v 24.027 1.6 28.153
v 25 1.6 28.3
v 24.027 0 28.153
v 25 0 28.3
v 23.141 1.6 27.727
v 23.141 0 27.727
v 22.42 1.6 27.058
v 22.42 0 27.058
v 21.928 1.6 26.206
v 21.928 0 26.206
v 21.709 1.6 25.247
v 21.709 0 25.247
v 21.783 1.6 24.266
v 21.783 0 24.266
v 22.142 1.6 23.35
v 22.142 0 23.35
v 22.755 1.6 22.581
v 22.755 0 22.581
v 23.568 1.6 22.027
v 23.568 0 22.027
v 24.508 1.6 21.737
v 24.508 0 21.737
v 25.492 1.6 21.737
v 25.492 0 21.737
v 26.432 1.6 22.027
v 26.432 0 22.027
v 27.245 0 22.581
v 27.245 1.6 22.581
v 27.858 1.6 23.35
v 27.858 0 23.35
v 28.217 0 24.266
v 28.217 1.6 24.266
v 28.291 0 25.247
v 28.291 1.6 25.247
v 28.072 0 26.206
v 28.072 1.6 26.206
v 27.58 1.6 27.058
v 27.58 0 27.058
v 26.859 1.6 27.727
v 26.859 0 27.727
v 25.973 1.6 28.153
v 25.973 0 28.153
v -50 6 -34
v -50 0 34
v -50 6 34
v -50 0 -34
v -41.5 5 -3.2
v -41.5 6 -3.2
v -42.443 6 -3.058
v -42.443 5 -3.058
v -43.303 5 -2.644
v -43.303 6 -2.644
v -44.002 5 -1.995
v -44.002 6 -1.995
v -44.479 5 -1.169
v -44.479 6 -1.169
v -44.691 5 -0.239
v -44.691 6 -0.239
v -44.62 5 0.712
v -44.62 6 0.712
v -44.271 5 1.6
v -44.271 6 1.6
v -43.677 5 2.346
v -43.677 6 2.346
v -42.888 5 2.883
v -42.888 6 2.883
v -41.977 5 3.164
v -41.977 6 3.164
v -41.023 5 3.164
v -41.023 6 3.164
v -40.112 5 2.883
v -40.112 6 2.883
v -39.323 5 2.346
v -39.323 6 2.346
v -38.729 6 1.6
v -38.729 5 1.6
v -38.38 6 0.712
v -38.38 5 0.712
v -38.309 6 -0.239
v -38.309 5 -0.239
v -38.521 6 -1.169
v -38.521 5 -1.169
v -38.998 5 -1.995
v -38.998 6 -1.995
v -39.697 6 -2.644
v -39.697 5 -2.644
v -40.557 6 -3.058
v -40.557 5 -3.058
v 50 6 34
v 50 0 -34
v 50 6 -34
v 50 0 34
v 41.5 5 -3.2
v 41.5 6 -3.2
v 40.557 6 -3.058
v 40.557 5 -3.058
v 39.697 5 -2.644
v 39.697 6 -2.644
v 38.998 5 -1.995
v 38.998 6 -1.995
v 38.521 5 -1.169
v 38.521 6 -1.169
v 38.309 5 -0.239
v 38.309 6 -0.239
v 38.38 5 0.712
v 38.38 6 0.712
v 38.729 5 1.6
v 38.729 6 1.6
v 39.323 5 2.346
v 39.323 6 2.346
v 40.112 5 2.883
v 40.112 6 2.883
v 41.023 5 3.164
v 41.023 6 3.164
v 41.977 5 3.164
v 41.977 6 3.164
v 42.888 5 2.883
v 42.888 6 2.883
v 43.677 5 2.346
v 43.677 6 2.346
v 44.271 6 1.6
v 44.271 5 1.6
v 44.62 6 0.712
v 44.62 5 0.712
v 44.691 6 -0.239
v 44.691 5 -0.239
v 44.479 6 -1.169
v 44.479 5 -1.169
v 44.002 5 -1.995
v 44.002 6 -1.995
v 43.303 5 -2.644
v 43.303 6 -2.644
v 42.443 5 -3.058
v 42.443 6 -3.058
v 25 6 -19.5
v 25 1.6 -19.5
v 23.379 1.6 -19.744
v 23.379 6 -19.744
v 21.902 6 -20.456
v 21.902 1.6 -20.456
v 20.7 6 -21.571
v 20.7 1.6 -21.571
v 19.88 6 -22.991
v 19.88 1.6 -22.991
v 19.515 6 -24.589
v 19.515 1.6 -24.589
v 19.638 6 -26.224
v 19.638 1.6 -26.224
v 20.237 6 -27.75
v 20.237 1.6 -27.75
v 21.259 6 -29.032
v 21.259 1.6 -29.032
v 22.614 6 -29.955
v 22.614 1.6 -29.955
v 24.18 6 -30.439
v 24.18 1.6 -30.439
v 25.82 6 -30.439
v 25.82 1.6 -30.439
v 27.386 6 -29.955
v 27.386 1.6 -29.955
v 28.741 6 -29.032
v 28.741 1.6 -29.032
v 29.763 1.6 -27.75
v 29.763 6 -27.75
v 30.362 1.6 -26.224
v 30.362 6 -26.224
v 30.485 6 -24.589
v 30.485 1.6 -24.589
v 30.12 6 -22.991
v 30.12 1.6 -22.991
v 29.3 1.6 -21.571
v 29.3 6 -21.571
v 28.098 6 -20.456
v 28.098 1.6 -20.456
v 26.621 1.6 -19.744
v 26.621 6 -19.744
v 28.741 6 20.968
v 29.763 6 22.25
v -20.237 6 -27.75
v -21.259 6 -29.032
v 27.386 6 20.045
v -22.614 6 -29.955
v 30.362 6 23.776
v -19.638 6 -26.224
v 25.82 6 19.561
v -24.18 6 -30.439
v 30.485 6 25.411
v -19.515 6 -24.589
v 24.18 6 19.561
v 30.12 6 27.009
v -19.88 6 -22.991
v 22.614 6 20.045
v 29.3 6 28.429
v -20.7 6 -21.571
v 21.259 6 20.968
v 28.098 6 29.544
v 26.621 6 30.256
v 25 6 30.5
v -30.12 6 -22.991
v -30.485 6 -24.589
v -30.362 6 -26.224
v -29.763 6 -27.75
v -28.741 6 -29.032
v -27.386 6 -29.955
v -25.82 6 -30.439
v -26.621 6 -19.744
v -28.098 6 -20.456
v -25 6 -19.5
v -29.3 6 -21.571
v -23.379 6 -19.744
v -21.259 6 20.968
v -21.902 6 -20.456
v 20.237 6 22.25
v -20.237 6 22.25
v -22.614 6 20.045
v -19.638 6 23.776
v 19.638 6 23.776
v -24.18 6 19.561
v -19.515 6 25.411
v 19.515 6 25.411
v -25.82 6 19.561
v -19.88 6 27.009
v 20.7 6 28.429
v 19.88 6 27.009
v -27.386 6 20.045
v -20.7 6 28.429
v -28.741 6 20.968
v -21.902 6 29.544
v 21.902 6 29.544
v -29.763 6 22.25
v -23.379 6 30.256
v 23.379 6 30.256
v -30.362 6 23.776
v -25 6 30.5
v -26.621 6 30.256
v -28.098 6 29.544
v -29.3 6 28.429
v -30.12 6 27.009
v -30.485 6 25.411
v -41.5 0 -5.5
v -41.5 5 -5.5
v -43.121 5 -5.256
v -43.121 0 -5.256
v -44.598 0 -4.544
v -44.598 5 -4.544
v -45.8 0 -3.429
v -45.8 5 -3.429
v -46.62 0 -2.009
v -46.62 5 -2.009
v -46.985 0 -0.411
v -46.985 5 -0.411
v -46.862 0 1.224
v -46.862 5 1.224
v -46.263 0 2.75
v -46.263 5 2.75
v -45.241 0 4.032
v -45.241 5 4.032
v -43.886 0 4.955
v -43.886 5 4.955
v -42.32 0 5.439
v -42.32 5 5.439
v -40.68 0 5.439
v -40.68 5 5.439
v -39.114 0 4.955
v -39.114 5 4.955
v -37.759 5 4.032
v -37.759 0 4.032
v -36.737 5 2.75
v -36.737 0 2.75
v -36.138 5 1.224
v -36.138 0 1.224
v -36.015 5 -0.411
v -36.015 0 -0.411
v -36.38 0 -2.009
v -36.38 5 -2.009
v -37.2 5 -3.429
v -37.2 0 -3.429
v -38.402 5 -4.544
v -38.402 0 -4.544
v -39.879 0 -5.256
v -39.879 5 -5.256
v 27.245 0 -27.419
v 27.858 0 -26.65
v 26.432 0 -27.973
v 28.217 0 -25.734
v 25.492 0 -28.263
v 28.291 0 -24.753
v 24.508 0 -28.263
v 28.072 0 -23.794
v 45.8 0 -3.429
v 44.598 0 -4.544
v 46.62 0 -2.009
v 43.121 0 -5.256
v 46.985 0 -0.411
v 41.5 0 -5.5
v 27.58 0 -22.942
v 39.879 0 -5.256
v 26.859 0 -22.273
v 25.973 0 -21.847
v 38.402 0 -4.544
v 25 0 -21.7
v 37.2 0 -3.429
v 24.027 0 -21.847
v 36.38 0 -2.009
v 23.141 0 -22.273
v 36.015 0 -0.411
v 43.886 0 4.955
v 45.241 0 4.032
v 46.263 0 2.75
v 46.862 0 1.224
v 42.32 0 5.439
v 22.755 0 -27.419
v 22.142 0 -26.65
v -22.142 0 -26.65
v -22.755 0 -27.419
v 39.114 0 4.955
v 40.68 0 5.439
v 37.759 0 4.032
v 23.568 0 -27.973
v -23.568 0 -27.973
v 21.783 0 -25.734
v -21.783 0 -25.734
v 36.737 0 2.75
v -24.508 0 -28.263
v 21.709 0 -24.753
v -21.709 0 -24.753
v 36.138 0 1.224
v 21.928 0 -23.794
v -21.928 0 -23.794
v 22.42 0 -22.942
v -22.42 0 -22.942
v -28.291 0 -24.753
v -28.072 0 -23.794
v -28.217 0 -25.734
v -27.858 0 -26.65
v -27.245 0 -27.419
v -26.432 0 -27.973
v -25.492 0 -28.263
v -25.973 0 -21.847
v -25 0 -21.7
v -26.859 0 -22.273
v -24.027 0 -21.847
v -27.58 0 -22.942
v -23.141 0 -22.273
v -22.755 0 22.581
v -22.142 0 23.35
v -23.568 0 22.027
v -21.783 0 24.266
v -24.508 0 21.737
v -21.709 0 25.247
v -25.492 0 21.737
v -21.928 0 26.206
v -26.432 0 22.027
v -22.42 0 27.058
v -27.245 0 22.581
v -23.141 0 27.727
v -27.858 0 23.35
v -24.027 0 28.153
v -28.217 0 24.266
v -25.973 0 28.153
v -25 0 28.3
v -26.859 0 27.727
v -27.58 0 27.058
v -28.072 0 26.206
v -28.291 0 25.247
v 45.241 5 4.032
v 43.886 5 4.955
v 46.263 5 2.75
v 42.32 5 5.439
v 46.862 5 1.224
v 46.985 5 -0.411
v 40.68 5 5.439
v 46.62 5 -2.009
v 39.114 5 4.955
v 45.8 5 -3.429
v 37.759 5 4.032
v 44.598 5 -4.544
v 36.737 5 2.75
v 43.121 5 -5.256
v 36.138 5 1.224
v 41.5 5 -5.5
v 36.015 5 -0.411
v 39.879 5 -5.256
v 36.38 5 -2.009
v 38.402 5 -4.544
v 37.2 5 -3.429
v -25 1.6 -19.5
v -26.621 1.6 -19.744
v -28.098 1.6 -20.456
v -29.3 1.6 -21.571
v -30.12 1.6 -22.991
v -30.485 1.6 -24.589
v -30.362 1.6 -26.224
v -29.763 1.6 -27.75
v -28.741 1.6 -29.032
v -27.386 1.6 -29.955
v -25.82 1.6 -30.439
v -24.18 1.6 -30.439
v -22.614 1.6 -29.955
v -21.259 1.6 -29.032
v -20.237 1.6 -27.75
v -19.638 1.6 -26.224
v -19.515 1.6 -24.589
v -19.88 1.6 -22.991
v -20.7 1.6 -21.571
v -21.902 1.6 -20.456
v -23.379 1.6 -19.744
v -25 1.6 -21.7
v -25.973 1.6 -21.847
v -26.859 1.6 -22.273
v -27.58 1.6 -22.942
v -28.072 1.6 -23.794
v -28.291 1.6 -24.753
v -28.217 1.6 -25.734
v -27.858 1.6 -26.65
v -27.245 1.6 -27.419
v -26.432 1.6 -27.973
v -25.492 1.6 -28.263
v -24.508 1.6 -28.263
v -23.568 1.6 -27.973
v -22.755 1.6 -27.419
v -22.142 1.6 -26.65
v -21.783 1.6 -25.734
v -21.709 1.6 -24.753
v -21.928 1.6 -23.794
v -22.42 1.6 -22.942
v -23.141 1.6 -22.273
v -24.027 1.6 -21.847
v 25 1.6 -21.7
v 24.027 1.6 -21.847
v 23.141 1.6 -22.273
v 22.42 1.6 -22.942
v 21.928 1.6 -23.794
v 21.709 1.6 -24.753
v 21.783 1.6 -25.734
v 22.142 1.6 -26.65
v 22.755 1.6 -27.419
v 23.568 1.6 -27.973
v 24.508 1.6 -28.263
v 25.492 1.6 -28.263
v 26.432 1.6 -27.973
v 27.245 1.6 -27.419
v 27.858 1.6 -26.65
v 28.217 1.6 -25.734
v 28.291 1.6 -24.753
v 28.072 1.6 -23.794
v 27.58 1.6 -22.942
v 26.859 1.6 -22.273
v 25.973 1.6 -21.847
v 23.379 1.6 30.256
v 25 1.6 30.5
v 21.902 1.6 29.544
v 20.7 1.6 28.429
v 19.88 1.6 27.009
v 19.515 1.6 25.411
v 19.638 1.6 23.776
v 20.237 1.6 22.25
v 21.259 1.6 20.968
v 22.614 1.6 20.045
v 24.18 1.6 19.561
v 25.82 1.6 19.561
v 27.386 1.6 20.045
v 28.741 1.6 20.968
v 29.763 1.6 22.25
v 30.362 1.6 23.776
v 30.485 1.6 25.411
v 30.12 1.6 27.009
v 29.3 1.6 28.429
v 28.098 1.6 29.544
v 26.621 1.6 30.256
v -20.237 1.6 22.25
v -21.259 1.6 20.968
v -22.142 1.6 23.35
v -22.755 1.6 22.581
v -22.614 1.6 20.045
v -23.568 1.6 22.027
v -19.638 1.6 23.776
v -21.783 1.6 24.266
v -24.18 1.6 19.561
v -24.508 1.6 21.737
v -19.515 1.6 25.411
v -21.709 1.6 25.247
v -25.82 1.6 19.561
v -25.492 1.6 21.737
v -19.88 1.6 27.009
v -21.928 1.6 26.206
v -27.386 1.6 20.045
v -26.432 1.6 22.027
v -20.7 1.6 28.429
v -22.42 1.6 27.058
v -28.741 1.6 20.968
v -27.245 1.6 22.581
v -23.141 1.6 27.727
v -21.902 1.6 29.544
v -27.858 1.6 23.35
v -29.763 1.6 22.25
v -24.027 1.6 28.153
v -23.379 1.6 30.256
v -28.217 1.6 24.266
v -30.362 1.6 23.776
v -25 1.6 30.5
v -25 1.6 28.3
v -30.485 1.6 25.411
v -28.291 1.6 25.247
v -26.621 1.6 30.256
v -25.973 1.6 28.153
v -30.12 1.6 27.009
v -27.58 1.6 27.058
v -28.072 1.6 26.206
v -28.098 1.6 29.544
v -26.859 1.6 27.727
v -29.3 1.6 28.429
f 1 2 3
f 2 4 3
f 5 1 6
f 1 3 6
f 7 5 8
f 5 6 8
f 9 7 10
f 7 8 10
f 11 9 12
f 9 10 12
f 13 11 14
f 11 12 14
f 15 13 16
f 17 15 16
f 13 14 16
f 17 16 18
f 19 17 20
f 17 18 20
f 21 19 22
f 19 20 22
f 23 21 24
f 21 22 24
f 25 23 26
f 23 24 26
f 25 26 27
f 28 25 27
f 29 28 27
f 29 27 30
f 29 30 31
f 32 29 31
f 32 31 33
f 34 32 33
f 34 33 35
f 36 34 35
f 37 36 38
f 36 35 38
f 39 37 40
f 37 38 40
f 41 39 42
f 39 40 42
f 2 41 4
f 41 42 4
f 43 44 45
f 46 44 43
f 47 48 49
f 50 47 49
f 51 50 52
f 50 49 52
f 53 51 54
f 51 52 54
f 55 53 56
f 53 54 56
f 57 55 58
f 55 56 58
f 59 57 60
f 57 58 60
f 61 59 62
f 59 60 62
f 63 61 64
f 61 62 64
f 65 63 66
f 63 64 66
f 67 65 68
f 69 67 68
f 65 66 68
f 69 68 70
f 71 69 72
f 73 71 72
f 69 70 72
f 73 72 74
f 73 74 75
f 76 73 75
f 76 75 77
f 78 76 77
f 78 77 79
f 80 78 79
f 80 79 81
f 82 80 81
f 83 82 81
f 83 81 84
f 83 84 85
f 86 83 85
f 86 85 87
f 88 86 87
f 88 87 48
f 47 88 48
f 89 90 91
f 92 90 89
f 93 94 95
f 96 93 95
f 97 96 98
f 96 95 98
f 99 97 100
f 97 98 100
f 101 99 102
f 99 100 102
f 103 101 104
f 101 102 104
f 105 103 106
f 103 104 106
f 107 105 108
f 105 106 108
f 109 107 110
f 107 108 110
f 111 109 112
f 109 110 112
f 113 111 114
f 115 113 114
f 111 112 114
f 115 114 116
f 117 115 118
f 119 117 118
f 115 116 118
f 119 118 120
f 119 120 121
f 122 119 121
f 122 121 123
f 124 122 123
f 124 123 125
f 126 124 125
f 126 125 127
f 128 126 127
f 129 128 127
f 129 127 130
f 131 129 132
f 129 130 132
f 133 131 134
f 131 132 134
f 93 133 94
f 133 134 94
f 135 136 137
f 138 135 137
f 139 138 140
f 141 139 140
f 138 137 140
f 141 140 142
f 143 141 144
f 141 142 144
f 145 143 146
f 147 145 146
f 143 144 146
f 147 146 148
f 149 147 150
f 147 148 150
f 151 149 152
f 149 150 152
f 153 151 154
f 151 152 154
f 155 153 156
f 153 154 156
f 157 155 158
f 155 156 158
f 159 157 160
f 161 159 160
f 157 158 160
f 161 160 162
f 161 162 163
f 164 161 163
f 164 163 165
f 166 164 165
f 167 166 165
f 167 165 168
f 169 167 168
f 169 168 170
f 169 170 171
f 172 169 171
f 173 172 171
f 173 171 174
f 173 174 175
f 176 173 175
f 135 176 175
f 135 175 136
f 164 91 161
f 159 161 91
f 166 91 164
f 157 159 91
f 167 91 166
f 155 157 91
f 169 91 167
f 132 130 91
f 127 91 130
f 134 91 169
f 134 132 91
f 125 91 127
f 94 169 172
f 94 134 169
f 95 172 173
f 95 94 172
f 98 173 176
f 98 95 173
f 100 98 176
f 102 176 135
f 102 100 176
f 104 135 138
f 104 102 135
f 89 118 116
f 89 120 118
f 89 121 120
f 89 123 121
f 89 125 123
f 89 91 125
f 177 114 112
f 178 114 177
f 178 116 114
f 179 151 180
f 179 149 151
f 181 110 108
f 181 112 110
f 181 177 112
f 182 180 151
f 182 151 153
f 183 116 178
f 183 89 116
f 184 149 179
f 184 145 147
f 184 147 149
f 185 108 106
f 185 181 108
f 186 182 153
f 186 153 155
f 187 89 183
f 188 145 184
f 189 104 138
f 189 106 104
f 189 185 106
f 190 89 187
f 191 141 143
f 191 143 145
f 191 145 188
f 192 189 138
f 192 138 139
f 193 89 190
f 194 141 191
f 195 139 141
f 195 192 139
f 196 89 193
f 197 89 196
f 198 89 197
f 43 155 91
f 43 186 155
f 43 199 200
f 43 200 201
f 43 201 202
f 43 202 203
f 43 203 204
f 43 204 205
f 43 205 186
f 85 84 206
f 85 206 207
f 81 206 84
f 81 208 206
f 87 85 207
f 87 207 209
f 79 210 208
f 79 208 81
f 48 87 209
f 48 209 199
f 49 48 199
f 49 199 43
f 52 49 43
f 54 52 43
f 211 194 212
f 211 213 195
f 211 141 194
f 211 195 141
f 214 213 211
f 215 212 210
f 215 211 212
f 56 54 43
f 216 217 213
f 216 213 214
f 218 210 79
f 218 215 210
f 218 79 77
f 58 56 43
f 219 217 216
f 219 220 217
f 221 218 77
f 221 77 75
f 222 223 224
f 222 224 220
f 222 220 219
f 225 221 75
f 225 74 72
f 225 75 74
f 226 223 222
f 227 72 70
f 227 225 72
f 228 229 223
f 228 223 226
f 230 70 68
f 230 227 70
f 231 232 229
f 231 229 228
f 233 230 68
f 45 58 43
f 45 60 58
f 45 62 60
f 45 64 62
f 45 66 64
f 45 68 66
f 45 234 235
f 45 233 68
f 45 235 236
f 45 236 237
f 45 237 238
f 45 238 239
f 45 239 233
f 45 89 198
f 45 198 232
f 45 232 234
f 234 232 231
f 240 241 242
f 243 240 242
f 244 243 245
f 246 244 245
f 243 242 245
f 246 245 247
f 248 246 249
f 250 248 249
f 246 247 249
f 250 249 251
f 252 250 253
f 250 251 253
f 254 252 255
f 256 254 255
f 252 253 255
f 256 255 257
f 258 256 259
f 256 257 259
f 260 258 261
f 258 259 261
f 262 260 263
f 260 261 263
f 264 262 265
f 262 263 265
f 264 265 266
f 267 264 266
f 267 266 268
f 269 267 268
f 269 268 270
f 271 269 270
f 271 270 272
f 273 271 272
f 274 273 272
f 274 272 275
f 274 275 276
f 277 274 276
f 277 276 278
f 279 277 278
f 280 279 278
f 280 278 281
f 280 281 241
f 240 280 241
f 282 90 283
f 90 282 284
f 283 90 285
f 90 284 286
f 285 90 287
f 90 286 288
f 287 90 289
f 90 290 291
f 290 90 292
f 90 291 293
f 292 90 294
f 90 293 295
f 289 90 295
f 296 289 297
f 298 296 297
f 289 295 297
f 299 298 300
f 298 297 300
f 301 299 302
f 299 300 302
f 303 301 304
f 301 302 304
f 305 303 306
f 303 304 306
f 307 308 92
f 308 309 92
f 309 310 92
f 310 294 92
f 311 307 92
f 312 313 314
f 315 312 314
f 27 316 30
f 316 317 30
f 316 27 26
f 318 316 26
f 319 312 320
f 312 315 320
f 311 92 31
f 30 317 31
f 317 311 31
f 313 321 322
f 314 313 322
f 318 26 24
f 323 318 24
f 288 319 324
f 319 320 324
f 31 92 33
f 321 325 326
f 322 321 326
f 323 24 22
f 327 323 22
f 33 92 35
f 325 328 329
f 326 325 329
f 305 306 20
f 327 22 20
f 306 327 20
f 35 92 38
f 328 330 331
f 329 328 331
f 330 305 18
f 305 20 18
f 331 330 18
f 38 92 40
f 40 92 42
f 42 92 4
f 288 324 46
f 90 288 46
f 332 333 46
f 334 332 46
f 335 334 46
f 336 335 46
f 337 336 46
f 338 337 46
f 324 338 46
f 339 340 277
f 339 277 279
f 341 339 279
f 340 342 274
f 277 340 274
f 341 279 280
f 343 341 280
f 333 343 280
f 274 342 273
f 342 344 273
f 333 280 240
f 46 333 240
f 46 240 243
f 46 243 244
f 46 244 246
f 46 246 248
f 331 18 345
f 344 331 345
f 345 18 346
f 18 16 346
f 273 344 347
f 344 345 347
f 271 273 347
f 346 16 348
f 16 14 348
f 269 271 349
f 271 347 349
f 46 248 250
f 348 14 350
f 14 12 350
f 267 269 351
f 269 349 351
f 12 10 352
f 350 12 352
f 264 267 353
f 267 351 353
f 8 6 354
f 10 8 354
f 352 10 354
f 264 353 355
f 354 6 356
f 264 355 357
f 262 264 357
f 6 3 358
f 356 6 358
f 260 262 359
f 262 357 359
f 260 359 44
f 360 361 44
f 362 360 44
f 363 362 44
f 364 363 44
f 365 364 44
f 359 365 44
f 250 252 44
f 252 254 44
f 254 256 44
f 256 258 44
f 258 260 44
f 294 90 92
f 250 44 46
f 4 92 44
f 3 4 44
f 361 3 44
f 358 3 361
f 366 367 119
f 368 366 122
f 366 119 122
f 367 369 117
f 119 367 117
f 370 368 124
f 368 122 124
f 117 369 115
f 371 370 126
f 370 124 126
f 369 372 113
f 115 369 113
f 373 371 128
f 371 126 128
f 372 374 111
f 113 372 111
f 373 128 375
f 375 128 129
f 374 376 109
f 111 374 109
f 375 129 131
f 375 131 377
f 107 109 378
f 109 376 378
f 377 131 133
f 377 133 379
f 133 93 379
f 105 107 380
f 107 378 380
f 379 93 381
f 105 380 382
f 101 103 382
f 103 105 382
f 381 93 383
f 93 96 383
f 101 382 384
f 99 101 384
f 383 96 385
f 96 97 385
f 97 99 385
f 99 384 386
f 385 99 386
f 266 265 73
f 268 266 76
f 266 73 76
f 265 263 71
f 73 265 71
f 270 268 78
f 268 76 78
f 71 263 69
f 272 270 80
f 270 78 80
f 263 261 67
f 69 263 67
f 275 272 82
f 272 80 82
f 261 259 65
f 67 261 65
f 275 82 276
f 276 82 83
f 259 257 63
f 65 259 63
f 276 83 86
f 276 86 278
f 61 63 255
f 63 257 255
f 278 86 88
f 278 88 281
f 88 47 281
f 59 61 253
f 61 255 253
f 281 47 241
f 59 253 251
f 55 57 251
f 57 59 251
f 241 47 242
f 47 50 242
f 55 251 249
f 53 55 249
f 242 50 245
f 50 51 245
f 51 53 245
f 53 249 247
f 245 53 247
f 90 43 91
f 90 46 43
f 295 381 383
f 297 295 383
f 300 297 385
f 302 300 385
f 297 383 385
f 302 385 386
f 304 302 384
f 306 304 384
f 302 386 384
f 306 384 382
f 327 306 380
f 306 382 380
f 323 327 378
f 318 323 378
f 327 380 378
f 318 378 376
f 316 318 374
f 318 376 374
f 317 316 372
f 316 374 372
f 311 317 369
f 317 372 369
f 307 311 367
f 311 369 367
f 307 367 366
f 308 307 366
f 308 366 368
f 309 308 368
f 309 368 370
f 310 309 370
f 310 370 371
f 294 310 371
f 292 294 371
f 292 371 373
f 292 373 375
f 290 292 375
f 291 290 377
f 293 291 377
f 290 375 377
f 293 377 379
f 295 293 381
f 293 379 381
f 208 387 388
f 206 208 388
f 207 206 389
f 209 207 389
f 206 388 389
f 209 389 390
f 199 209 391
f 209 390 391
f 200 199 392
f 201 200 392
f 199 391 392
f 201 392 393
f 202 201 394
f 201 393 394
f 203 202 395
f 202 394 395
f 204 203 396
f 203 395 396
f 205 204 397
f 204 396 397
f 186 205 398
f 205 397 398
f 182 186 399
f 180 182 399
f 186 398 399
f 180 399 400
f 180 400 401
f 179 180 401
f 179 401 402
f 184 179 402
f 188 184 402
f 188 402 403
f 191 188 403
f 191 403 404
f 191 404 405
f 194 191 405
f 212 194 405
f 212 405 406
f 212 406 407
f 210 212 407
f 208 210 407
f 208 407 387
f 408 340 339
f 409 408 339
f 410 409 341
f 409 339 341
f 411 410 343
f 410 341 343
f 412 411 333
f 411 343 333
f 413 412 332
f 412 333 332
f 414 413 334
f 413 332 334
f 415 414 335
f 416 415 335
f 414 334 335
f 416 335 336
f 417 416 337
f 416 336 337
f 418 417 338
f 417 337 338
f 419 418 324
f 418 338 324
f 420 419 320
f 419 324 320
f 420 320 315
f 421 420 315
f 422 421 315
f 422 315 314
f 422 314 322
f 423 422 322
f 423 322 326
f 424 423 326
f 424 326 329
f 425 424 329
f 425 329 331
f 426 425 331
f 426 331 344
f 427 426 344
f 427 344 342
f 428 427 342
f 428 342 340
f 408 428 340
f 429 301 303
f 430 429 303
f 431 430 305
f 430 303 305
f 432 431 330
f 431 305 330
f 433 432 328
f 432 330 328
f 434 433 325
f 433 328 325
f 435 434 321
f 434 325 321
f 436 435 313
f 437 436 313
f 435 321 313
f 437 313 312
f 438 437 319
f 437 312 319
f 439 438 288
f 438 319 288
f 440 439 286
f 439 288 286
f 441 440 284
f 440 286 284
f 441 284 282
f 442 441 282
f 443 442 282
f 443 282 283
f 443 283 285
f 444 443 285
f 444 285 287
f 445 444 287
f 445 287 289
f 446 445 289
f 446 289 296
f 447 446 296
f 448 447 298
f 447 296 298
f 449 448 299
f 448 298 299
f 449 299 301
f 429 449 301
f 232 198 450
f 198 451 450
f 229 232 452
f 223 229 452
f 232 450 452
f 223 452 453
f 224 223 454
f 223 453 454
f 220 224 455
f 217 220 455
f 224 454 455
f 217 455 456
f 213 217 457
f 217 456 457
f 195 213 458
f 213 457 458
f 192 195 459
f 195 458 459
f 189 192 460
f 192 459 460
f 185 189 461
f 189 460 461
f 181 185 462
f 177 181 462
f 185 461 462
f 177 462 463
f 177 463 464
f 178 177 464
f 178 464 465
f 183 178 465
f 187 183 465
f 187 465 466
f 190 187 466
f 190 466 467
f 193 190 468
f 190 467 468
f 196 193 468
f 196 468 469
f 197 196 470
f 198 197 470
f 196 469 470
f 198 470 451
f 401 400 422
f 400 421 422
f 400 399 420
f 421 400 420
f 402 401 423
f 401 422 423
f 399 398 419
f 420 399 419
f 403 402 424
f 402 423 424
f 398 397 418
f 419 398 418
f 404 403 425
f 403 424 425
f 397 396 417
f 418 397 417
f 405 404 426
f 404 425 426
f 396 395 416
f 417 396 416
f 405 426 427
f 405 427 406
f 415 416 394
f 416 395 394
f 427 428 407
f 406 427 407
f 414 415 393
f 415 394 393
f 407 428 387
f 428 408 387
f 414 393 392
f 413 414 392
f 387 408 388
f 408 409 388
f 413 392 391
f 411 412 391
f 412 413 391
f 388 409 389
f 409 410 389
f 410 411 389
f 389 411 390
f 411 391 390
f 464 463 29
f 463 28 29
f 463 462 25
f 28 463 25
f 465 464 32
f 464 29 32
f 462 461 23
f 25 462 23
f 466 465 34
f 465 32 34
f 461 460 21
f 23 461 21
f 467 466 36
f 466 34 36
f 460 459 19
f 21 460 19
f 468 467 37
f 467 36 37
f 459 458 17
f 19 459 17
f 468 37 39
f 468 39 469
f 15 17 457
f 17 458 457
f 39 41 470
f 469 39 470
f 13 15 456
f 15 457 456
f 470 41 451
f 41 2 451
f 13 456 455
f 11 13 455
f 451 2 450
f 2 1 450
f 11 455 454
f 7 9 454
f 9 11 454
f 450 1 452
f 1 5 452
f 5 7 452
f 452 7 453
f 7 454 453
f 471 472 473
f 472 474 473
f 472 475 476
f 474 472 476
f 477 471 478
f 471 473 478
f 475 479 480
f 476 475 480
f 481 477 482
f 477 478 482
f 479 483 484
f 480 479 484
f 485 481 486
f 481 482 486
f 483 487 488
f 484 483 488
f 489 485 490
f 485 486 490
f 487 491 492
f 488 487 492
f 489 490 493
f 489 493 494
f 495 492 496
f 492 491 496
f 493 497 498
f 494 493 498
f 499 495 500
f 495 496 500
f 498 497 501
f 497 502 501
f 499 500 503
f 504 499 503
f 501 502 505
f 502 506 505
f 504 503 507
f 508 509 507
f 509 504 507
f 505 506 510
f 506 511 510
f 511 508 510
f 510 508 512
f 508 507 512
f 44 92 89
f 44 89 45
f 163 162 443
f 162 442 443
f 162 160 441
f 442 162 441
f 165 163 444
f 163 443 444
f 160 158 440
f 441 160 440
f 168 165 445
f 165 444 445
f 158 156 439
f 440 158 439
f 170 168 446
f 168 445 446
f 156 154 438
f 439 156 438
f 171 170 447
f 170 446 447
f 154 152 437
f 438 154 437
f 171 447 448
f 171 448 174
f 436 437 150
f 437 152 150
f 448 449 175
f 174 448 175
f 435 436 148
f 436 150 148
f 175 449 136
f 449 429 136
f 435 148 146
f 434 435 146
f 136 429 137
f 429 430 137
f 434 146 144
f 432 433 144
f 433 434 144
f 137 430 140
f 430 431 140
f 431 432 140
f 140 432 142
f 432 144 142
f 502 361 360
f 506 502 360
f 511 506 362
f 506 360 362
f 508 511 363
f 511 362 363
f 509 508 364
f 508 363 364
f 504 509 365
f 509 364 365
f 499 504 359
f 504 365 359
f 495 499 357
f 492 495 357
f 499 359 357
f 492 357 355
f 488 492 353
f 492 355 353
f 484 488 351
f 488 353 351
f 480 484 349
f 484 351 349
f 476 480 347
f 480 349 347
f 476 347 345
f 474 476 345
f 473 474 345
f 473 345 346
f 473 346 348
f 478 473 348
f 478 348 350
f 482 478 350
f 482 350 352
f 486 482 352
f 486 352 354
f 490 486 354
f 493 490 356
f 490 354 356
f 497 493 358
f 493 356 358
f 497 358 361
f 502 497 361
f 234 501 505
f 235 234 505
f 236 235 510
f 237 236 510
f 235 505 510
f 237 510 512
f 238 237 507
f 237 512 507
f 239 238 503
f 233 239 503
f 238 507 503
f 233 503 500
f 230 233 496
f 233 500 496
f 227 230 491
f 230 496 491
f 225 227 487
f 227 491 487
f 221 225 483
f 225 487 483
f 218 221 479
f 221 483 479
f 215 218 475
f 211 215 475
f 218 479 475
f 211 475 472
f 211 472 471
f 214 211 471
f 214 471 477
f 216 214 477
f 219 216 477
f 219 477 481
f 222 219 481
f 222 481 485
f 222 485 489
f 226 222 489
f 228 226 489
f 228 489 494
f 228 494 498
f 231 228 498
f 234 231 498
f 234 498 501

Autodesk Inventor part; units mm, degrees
ref_plane "YZ Plane" through (0, 0, 0) normal (1, 0, 0) x (0, 1, 0)
ref_plane "XZ Plane" through (0, 0, 0) normal (0, 1, 0) x (-1, 0, 0)
ref_plane "XY Plane" through (0, 0, 0) normal (0, 0, 1) x (1, 0, 0)
sketch "Sketch1" plane through (0, 0, 0) normal (0, 1, 0) x (-1, 0, 0)
  line L0 (-50, 34) -> (50, 34)
  line L1 (50, 34) -> (50, -34)
  line L2 (50, -34) -> (-50, -34)
  line L3 (-50, -34) -> (-50, 34)
  line L4 (-50, 34) -> (50, -34) construction
  line L5 (50, 34) -> (-50, -34) construction
  point P0 (0, 0)
  dimension "d0" = 68
  dimension "d1" = 100
extrude "Extrusion1" add sketch "Sketch1" along normal blind 6
sketch "Sketch2" plane through (0, 0, 0) normal (0, 1, 0) x (1, 0, 0)
  line L0 (0, 47.6) -> (0, -47.6) projected
  point P0 (0, 0)
  point P1 (-41.5, 0)
  point P2 (41.5, 0)
  dimension "d4" = 83
sketch "Sketch3" plane through (0, 6, 0) normal (0, 1, 0) x (1, 0, 0)
  line L0 (25, 25) -> (-25, 25) construction
  line L1 (-25, 25) -> (-25, -25) construction
  line L2 (-25, -25) -> (25, -25) construction
  line L3 (25, -25) -> (25, 25) construction
  line L4 (25, 25) -> (-25, -25) construction
  line L5 (-25, 25) -> (25, -25) construction
  point P0 (0, 0)
  dimension "d12" = 50
  dimension "d13" = 50
hole "Hole2" at (-25, 6, 25) at (-25, 6, -25) at (25, 6, -25) at (25, 6, 25) direction (0, -1, 0) diameter 6.6 end through all counterbore diameter 11 counterbore depth 4.4 clearance for "Socket Head Cap Screw ISO 4762" size "M6" standard "ISO"
hole "Hole3" at (-41.5, 0, 0) at (41.5, 0, 0) direction (0, 1, 0) diameter 6.4 end through all counterbore diameter 11 counterbore depth 5 clearance for "Socket Head Cap Screw ISO 4762" size "M6" standard "ISO"
properties part number "KN-00-01-02" material "X5CrNi18-10"
